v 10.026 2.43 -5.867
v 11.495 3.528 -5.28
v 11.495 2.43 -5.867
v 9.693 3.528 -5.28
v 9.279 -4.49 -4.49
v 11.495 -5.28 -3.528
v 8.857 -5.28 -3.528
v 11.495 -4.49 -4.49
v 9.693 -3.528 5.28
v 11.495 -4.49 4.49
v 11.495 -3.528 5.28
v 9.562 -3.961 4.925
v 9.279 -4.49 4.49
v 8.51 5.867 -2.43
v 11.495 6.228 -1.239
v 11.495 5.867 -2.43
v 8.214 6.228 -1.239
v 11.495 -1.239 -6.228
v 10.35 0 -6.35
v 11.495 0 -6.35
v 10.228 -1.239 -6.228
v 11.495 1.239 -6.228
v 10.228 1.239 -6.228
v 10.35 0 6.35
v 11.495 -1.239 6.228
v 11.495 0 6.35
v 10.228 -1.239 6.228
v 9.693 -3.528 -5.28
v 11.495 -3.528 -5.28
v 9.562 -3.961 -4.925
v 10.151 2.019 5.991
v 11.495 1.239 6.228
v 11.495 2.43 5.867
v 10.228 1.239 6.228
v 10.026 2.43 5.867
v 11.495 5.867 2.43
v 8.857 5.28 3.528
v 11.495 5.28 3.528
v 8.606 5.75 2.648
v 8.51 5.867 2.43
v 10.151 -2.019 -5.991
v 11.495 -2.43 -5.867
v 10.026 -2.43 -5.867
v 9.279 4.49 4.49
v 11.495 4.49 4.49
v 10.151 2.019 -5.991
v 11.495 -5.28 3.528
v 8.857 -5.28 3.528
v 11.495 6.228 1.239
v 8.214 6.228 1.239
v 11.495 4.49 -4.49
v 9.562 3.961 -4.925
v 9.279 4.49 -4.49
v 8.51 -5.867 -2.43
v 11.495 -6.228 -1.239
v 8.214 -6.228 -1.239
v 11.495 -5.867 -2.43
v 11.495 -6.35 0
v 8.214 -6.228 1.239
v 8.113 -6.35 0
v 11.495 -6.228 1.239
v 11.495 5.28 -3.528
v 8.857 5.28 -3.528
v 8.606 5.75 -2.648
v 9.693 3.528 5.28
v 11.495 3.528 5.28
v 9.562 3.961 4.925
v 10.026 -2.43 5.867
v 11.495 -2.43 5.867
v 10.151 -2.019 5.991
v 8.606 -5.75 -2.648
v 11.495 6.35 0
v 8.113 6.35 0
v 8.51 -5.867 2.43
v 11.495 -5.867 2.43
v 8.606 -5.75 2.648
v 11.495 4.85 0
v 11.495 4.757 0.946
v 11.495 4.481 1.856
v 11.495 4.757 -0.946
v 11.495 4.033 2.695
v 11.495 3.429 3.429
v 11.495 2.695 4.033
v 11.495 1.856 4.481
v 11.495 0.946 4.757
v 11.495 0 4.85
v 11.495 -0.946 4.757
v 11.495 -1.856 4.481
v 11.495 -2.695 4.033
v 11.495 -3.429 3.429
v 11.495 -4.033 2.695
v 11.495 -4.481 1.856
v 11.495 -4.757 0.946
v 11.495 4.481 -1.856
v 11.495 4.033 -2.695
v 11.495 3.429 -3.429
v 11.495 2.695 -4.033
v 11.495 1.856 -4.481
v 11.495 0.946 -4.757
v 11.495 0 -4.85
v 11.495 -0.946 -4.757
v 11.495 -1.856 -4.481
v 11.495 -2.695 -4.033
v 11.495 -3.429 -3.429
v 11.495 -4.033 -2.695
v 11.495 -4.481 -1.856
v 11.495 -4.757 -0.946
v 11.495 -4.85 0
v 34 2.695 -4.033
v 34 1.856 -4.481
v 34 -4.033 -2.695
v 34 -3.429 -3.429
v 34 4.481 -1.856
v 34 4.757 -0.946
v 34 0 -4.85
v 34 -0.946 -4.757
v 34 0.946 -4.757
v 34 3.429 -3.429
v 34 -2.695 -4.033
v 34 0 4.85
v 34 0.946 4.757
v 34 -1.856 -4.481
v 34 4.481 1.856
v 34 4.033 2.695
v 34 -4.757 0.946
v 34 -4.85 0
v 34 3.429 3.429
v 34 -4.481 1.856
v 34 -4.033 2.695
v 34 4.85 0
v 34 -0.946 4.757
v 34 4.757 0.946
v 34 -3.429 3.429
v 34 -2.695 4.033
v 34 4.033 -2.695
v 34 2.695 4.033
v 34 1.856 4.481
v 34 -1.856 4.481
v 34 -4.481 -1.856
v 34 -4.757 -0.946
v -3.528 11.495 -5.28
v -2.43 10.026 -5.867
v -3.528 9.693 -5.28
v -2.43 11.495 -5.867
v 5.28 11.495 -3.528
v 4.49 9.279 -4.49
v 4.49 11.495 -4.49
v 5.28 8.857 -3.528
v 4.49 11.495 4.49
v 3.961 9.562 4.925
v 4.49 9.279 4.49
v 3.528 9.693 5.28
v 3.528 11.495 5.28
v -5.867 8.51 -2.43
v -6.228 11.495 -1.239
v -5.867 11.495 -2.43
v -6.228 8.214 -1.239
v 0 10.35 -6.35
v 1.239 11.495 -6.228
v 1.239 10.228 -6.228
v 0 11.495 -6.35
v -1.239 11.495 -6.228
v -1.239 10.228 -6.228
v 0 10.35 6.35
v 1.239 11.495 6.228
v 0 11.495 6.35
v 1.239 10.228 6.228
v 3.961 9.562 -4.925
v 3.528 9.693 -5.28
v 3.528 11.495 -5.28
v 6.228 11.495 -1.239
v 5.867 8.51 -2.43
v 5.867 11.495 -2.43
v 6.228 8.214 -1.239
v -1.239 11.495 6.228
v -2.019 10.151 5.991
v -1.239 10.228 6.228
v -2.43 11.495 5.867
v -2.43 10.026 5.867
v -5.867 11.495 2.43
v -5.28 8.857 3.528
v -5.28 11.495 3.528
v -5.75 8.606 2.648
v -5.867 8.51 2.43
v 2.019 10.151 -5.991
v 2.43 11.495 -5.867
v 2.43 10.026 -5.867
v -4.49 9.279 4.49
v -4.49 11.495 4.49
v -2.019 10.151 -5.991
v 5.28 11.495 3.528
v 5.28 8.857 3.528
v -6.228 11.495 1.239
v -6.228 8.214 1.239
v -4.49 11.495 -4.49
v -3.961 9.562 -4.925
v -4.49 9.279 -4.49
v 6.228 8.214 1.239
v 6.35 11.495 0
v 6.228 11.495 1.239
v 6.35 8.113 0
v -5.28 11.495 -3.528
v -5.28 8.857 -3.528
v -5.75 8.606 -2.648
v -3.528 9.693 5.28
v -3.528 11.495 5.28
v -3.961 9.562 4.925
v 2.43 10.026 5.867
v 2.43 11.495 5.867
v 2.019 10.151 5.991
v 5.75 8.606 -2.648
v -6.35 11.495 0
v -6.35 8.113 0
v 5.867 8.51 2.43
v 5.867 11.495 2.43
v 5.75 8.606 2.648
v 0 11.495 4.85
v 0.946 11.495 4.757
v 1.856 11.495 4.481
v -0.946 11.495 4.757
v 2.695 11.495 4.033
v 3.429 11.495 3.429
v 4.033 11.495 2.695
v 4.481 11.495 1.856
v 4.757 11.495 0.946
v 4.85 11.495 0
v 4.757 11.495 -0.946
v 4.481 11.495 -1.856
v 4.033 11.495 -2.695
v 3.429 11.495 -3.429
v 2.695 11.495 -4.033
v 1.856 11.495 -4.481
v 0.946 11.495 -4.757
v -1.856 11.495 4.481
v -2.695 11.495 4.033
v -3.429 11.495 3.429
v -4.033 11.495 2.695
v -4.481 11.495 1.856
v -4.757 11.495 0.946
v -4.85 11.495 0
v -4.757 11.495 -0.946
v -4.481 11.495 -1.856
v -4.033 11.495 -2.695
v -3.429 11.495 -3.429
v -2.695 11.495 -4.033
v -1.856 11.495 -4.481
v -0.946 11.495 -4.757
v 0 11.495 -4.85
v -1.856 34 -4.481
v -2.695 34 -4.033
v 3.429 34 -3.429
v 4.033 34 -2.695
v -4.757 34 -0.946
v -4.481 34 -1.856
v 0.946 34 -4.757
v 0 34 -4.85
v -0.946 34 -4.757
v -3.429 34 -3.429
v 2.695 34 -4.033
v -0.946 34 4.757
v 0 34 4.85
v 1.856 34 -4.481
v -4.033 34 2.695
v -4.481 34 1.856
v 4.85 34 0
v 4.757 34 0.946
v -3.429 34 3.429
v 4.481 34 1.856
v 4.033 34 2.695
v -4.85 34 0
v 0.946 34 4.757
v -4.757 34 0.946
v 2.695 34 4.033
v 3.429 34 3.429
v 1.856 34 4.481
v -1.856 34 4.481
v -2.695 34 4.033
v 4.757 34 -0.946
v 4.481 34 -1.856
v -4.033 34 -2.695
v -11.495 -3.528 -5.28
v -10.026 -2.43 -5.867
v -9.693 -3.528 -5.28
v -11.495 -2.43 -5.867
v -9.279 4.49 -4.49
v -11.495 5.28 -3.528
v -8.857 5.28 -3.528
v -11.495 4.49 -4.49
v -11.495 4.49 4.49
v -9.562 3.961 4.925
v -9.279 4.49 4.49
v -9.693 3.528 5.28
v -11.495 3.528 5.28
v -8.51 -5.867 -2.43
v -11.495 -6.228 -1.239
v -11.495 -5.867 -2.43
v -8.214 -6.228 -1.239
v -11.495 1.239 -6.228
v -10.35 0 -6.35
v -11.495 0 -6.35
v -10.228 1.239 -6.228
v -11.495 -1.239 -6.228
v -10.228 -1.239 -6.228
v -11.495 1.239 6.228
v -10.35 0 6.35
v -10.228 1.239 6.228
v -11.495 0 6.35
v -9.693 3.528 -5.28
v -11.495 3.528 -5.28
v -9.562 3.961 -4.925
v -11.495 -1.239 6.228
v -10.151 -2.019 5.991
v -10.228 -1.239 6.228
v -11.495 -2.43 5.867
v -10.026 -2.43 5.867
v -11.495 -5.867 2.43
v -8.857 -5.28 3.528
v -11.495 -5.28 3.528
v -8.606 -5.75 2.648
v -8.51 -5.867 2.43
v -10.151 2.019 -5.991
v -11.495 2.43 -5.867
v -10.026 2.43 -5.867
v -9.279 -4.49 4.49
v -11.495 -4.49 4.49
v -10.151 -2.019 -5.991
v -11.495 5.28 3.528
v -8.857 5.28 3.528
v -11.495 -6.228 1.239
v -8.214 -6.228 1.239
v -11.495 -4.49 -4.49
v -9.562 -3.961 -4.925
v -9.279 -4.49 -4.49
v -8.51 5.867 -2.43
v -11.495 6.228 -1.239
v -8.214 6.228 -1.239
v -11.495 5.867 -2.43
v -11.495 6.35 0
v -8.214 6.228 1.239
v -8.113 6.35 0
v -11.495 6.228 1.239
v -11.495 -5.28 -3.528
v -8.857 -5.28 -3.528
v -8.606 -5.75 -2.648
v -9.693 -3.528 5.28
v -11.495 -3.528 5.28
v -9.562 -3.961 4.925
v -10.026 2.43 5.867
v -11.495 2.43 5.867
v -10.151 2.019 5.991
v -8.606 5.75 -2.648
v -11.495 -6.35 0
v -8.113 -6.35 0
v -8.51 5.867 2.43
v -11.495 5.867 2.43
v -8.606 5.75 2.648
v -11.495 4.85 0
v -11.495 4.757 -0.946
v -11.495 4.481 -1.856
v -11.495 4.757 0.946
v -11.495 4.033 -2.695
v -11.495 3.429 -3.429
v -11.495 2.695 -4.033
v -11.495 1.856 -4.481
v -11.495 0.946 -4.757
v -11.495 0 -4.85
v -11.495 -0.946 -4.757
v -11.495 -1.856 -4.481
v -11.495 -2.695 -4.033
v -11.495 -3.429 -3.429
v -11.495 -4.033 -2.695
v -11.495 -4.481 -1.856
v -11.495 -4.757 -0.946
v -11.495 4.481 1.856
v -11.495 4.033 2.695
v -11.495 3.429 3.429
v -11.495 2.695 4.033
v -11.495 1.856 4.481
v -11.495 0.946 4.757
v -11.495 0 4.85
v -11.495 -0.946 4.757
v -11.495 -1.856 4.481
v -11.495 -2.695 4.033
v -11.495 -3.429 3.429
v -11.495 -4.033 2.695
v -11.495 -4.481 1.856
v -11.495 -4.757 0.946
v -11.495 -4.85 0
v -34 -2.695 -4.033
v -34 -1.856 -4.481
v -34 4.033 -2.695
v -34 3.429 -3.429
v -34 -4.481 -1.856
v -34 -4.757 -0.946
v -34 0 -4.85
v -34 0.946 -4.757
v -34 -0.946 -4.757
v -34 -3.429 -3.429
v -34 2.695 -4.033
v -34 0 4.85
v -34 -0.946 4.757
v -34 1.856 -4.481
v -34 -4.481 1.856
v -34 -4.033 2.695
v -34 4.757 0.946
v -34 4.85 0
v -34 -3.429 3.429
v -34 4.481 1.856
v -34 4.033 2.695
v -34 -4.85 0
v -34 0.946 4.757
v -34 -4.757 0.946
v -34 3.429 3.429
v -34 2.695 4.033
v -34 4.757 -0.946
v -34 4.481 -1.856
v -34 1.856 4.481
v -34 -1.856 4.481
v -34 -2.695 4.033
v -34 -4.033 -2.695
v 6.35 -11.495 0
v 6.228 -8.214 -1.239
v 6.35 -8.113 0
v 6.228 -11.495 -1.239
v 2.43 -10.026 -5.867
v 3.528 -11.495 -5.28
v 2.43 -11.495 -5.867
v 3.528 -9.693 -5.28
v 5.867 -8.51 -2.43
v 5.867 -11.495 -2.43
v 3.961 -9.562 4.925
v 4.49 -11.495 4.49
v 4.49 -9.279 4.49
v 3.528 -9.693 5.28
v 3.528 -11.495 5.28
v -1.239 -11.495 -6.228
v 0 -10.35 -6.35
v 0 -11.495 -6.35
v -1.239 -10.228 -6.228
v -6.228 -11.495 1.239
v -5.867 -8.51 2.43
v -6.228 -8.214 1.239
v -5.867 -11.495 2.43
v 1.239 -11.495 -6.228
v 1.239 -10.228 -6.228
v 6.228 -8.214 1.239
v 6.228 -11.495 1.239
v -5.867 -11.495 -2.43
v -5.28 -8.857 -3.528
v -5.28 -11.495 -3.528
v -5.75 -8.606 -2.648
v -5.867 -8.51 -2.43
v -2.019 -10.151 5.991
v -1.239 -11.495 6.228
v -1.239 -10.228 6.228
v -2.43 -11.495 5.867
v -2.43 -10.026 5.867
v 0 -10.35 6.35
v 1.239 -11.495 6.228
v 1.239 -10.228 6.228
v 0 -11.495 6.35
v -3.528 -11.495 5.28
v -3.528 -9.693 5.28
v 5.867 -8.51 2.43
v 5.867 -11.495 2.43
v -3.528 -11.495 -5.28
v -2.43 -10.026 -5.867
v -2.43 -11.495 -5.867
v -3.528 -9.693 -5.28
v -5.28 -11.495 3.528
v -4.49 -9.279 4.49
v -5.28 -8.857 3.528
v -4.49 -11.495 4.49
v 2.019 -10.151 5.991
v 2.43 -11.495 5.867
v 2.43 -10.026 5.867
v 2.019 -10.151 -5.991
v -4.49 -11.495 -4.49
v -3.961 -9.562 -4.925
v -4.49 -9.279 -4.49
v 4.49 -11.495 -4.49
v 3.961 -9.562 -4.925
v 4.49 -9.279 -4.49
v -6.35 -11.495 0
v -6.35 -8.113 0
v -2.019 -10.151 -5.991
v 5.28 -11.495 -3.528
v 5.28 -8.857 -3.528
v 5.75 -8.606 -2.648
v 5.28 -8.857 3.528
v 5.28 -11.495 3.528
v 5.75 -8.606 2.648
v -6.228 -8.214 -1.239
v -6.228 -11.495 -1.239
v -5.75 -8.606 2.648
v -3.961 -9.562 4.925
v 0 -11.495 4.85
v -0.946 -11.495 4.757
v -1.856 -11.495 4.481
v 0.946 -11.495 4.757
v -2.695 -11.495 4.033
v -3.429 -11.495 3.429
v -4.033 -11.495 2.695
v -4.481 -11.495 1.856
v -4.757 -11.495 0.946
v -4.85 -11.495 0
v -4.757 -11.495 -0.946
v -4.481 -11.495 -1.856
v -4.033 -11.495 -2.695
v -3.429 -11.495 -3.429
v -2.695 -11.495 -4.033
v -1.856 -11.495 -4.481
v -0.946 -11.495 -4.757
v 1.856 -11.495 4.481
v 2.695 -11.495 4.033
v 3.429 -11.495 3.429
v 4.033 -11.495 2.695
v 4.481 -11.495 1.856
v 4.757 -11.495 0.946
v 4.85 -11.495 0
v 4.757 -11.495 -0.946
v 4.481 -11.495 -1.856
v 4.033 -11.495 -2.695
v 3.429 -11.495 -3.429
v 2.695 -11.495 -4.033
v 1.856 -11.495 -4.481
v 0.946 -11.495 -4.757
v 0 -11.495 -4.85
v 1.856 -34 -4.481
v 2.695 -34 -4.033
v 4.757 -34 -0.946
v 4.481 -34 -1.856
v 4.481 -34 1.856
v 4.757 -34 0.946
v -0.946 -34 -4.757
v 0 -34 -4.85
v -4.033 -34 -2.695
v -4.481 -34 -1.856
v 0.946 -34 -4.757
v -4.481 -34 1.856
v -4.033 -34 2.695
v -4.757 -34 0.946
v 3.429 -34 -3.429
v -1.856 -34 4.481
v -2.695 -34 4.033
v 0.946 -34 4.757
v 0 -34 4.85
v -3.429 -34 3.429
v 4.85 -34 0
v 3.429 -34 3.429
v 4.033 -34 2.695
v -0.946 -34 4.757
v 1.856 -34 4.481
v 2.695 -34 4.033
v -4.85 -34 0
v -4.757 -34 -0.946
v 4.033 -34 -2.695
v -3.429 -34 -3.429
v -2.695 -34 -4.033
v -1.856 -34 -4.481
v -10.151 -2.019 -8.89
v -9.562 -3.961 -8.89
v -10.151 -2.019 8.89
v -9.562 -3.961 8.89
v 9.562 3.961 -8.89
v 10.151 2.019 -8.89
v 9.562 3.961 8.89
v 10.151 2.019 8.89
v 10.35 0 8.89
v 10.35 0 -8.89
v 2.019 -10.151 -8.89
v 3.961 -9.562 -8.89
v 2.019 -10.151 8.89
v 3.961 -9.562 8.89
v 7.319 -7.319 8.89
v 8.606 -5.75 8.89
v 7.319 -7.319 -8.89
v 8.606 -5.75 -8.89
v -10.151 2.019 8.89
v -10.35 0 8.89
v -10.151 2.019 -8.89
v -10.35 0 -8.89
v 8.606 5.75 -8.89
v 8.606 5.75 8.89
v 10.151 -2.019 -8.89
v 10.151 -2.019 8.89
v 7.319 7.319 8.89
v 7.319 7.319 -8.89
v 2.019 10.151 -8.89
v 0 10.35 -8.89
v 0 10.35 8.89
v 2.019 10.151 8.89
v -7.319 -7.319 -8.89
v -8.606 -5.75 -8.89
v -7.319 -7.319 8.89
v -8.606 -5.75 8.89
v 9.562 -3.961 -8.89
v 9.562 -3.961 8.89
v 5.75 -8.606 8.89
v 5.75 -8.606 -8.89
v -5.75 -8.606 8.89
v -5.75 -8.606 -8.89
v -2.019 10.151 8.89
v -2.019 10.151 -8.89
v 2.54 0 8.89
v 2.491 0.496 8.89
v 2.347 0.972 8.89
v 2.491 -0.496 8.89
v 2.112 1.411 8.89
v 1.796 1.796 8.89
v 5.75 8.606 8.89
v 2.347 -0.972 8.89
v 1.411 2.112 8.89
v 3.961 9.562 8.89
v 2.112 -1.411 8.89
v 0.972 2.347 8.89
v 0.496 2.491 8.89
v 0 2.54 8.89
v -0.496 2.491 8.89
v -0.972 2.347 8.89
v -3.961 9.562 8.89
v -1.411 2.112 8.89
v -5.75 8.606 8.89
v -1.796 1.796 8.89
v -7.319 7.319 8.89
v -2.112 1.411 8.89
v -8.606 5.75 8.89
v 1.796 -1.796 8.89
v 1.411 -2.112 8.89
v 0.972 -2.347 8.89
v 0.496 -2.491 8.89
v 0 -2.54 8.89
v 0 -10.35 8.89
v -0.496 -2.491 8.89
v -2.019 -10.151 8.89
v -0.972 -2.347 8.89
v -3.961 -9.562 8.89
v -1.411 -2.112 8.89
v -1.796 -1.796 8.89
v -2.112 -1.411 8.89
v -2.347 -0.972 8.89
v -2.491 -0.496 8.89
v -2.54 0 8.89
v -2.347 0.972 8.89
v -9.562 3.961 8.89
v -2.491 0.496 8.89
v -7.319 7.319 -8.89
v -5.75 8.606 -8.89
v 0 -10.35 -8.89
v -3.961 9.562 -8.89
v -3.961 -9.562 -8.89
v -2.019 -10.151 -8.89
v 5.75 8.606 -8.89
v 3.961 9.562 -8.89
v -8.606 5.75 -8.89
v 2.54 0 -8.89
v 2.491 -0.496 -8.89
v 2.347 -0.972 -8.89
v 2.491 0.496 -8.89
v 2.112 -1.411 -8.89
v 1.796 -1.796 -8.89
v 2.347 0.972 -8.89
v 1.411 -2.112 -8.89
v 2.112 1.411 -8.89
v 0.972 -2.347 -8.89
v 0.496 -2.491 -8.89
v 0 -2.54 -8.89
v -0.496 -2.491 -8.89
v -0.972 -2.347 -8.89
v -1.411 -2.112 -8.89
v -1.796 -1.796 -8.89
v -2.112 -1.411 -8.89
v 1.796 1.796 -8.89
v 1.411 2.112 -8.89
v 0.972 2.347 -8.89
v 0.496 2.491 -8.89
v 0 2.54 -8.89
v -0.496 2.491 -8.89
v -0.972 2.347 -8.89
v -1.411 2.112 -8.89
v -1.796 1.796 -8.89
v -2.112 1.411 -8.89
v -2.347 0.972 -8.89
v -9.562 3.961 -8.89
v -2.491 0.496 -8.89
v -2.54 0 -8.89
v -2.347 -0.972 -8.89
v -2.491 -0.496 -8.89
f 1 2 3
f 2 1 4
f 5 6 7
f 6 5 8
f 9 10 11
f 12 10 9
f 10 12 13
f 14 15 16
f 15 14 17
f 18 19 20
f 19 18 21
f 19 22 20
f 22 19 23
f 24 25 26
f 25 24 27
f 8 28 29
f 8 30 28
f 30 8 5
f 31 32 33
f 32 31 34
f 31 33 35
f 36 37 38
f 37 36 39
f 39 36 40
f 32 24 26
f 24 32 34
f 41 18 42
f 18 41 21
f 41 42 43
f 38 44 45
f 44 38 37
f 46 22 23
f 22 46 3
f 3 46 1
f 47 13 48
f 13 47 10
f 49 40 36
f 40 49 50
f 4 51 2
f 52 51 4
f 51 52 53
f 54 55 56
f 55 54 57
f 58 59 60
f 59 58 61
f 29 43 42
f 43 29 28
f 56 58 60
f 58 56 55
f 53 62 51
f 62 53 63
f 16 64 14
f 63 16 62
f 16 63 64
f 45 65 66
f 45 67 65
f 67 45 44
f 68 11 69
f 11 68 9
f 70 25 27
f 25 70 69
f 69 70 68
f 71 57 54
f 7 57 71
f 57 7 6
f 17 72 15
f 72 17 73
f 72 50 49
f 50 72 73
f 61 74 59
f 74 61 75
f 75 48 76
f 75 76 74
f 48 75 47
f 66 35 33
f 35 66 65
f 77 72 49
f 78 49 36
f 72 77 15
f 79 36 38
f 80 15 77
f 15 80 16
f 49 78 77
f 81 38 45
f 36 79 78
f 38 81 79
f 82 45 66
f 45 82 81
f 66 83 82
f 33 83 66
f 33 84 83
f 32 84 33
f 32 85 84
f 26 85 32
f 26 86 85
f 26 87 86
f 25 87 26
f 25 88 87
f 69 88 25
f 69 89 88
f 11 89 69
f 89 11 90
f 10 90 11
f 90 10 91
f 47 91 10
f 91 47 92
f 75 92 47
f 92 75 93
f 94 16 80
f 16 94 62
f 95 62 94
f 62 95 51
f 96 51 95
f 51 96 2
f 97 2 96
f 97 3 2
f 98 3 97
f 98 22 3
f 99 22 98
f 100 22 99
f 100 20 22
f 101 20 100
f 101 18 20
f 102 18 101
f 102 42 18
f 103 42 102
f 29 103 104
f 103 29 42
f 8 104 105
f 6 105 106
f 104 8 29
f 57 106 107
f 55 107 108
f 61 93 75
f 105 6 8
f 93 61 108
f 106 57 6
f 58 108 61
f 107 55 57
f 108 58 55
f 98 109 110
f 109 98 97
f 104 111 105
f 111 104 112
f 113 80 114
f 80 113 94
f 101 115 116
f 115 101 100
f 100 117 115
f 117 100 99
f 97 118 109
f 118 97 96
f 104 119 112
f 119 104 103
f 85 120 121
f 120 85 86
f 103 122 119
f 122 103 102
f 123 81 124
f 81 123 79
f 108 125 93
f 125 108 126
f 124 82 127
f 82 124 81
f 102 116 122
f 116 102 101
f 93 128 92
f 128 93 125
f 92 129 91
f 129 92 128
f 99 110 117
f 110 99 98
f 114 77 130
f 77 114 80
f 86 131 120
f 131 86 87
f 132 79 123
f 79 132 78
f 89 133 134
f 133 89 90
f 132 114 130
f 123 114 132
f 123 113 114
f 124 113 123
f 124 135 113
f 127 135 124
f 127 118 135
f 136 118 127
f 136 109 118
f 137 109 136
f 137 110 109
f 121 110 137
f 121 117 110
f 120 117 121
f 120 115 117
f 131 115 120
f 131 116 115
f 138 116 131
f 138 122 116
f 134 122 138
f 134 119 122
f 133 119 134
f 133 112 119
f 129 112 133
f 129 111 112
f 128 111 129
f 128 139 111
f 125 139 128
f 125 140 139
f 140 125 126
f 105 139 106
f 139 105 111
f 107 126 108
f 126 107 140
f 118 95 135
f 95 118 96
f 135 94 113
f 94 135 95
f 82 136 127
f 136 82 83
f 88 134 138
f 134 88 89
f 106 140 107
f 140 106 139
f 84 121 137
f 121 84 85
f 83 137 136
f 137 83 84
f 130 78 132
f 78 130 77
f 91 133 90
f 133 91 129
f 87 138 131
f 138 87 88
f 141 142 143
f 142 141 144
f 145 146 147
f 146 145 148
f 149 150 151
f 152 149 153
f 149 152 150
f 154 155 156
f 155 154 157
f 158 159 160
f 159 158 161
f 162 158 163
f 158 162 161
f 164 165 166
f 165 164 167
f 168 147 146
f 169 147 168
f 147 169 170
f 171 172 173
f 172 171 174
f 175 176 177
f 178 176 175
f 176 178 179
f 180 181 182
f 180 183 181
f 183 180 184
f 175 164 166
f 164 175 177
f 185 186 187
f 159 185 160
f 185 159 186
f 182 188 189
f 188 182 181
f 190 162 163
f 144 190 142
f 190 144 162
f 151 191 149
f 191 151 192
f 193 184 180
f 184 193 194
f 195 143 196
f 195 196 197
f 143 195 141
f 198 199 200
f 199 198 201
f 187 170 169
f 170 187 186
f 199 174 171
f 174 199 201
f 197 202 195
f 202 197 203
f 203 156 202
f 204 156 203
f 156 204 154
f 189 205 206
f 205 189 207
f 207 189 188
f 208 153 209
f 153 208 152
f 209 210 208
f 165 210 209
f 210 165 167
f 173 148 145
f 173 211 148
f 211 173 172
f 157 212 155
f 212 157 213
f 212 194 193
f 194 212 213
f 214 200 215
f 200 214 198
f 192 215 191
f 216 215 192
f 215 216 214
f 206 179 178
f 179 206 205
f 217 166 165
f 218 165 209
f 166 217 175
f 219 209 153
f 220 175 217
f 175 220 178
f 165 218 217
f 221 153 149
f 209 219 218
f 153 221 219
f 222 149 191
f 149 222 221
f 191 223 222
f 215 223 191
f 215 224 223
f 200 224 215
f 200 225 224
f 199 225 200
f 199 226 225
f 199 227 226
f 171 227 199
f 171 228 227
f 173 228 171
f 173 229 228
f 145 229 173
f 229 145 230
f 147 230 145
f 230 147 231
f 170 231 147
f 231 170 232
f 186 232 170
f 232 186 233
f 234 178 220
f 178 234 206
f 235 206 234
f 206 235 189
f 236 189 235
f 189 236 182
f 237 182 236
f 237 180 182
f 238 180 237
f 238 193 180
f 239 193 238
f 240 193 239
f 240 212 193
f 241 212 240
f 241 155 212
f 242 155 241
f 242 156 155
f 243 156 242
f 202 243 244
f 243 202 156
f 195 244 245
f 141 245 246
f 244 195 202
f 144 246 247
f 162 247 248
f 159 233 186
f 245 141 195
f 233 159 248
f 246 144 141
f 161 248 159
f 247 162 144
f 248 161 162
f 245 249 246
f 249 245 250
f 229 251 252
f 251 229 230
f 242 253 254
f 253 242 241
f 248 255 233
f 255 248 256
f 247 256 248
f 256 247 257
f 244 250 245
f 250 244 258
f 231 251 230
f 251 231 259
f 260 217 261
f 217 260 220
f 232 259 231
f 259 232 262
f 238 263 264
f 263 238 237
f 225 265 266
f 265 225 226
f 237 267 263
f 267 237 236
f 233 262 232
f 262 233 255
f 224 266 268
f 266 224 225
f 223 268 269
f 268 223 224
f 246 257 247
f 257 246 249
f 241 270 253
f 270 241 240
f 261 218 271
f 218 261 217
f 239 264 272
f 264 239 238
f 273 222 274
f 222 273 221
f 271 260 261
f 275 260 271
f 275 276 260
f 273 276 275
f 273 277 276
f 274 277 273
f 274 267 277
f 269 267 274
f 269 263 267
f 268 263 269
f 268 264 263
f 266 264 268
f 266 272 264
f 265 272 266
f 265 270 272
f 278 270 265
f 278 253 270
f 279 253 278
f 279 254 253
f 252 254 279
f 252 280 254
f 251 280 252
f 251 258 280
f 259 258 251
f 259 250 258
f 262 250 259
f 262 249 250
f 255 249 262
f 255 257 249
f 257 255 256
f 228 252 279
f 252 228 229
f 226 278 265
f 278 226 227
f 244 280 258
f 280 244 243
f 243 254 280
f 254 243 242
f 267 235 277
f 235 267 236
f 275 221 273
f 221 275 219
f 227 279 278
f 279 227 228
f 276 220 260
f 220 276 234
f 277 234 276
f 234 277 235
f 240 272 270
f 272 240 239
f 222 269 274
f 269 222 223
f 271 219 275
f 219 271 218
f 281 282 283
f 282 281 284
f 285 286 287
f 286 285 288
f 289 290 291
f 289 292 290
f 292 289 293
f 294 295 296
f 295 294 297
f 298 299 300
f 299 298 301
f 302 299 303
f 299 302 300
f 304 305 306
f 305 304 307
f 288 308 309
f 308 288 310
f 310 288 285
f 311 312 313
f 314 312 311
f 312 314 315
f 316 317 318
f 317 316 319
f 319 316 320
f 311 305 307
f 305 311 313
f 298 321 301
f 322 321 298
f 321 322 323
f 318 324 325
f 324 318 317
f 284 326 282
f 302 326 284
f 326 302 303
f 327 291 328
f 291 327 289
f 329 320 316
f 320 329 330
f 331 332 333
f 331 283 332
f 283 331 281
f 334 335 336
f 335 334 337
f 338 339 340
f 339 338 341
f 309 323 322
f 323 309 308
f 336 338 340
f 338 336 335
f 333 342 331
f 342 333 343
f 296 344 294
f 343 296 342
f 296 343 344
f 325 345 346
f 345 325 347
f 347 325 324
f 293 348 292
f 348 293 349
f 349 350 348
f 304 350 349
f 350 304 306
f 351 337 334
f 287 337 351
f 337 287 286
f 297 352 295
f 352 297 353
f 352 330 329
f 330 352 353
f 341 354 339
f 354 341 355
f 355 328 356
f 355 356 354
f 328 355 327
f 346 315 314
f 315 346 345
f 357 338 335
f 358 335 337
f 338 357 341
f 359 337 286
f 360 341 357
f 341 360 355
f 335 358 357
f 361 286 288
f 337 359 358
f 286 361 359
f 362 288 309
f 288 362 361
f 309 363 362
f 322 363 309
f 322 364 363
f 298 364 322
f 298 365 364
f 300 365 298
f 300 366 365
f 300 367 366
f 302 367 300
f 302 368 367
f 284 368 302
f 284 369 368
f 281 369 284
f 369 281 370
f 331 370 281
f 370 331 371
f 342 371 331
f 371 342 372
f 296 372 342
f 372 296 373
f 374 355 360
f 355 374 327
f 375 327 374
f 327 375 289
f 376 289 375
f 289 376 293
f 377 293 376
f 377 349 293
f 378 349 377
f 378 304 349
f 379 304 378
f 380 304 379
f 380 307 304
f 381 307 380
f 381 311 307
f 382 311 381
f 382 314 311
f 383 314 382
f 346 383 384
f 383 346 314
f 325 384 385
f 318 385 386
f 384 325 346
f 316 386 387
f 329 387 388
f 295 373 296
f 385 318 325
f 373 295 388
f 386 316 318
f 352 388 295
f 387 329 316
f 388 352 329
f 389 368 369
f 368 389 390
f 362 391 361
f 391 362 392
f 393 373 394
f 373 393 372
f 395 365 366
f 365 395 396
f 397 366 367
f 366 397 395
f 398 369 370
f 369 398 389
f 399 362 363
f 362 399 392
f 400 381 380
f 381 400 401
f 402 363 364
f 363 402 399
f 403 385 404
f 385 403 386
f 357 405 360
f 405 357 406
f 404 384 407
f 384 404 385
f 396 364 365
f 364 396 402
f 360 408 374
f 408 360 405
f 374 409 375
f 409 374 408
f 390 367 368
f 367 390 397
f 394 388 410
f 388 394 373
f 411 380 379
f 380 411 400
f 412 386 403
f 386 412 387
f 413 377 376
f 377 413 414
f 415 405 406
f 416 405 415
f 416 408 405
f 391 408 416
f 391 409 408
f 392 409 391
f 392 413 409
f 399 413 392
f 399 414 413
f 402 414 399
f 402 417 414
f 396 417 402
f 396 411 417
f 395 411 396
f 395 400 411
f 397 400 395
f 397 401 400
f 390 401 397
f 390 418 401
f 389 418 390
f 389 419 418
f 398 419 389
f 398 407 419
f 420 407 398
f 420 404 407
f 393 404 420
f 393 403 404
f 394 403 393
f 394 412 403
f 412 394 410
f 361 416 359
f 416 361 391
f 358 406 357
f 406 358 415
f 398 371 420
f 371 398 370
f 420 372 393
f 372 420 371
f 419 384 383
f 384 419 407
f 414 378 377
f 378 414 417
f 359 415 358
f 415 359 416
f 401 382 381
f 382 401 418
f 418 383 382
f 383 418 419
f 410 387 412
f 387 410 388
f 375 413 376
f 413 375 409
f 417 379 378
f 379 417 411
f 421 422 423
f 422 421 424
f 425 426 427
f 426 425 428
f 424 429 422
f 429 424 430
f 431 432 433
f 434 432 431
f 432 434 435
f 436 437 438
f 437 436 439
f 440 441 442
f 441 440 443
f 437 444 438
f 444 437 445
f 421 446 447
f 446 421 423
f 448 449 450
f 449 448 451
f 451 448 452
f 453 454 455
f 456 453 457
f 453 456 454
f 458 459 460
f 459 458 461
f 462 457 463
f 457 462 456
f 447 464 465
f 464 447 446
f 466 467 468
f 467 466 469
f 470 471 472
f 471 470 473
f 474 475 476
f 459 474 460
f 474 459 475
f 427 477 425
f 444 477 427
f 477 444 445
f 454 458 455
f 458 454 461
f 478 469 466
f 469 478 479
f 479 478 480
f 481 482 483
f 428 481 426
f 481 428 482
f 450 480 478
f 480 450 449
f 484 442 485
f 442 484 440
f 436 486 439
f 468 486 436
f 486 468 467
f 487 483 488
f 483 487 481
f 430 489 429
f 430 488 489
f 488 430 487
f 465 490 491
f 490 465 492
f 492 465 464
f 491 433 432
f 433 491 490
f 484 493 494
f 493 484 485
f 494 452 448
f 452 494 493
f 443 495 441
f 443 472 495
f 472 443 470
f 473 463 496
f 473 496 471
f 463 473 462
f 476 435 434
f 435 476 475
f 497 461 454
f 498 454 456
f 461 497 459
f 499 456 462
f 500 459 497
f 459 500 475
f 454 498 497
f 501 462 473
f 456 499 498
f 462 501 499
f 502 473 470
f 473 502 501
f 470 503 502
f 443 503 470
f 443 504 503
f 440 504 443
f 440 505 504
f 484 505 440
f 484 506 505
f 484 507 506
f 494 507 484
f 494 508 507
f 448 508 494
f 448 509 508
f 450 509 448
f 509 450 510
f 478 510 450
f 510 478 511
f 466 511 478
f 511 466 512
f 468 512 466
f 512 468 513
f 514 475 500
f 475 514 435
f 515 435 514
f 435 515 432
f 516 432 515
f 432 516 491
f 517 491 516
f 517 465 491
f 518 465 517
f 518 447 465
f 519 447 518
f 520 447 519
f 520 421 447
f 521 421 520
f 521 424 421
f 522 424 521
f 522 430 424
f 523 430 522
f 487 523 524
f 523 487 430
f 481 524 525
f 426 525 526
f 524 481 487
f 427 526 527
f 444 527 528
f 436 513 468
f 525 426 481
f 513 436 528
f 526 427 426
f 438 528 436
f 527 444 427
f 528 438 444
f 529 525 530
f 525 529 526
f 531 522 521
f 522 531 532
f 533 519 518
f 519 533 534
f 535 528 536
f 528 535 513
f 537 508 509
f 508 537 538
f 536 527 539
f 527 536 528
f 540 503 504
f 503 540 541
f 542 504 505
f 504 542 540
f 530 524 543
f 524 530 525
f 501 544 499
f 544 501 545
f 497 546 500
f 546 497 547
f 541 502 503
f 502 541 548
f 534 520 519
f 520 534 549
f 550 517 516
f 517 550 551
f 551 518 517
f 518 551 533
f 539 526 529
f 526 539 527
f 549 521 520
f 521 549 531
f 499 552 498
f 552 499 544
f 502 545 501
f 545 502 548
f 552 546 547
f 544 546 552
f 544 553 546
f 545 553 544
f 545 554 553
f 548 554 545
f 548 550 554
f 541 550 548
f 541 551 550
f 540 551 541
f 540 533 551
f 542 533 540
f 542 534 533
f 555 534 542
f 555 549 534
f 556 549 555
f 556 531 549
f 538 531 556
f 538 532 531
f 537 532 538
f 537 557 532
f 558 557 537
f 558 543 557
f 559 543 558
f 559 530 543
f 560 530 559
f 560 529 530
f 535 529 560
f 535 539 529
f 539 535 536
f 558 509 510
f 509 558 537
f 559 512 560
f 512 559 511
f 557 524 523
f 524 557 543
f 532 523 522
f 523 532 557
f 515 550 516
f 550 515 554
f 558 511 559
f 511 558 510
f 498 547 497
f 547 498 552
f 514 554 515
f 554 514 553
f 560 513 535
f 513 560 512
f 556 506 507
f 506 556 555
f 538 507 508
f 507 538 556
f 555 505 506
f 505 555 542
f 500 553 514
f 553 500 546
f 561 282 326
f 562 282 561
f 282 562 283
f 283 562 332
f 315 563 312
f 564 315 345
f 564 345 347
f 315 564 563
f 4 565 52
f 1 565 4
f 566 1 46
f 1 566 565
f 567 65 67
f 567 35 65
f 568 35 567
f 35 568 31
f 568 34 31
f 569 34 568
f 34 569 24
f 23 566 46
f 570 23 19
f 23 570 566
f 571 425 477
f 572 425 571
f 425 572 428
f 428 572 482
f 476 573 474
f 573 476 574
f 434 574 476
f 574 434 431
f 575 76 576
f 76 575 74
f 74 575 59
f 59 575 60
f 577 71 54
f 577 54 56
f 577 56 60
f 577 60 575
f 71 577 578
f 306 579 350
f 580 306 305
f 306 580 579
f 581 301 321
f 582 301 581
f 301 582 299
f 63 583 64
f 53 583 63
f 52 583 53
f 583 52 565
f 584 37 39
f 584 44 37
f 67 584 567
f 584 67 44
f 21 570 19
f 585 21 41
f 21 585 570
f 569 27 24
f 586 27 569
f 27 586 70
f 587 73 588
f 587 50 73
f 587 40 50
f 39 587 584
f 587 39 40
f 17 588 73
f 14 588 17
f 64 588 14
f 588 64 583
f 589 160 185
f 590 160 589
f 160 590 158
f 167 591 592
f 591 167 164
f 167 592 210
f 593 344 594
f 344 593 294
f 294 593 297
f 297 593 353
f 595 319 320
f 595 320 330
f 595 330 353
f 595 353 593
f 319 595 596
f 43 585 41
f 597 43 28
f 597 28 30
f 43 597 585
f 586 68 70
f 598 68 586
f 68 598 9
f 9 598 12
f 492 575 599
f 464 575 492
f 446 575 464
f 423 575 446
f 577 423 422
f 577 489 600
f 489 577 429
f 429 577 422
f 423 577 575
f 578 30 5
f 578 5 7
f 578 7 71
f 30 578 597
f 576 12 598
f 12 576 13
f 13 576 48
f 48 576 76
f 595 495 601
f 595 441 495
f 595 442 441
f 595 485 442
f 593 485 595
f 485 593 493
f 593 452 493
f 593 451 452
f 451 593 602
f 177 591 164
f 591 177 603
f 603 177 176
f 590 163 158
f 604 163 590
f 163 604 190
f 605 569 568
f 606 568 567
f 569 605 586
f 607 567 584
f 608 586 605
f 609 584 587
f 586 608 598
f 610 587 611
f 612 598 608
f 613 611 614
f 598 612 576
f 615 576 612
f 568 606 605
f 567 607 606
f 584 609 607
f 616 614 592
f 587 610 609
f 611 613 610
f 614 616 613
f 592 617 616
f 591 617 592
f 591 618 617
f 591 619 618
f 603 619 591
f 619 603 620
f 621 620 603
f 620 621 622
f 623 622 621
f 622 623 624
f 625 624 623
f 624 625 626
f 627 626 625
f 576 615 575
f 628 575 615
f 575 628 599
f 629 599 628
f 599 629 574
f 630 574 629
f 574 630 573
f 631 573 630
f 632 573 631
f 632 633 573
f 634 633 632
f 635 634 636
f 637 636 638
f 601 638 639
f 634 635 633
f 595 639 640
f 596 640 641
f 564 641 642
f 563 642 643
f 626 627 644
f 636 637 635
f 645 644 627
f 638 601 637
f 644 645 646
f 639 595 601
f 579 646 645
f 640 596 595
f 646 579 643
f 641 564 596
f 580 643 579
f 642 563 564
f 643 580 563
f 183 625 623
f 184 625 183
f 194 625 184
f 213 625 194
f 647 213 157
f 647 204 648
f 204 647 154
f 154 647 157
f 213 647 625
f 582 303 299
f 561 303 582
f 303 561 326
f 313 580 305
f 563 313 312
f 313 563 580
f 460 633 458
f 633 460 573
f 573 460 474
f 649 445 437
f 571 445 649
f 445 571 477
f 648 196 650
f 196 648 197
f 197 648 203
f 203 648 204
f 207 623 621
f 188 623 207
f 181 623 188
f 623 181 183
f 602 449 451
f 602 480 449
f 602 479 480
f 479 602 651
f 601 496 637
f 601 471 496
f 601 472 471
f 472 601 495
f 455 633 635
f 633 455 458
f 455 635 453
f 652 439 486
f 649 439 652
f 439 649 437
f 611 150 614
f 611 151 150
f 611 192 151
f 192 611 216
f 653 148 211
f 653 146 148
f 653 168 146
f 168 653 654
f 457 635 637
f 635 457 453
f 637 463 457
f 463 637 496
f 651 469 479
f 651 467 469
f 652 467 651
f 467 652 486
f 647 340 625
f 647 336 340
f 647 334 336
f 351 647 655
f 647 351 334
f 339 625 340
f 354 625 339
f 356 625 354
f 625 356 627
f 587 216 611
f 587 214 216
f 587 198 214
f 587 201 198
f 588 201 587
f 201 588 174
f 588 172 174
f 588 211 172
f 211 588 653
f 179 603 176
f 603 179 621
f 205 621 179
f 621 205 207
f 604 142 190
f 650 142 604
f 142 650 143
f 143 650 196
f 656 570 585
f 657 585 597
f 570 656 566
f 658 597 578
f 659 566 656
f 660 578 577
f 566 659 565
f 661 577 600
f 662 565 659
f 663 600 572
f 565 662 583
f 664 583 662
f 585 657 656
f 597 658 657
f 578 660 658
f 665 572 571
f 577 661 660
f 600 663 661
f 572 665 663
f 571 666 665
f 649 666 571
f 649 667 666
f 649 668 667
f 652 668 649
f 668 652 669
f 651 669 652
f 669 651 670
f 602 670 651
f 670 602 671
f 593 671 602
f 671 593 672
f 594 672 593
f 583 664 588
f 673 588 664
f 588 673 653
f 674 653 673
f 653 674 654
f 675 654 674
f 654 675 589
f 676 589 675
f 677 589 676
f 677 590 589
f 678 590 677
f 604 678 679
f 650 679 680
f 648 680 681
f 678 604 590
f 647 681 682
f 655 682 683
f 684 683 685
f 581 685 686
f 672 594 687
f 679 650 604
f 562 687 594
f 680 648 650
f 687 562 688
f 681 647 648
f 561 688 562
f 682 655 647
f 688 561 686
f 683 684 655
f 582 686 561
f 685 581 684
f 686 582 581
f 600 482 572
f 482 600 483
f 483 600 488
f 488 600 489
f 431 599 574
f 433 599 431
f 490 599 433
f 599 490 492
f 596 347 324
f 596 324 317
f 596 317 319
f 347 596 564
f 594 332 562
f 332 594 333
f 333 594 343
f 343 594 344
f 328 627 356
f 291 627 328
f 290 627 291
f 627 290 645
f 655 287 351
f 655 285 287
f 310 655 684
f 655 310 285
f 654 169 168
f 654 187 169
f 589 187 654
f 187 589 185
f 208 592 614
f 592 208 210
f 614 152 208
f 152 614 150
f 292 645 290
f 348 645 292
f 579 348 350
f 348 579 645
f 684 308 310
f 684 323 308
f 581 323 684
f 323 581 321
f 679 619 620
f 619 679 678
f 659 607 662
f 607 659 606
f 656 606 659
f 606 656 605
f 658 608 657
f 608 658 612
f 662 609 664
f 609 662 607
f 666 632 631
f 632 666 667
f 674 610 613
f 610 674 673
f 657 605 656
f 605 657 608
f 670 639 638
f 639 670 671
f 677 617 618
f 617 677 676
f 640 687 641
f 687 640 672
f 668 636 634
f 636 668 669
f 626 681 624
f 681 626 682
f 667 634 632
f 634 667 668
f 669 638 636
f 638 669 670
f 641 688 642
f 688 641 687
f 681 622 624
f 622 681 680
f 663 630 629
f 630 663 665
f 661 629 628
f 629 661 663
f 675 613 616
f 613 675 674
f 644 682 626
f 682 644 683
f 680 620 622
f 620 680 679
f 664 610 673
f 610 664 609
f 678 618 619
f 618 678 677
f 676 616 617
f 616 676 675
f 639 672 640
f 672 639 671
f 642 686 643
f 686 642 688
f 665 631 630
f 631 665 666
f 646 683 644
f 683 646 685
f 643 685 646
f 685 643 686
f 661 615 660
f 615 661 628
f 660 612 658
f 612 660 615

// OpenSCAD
$fn = 32;

// ----------------------------------------------------------------------
// Cardan cross: 68 mm span, 12.7 mm trunnions
// ----------------------------------------------------------------------

// --- parameters (mm) ---
journal_d = 12.7;         // trunnion diameter
arm_len = 34;             // trunnion length from the centre
step_r = 4.32;            // step position from the centre
step_d = 9.7;             // journal diameter after the step
hub_d = 20.7;             // hub diameter
hub_h = 17.78;            // hub height
bore_d = 5.08;            // hub bore

difference() {
  union() {
    /* hub along the joint axis */
    cylinder(h = hub_h, d = hub_d, center = true);
    for (a = [0 : 90 : 270]) rotate([0, 0, a]) {
      /* trunnion, sunk into the hub */
      translate([hub_d / 4, 0, 0]) rotate([0, 90, 0]) cylinder(h = step_r + 2, d = journal_d);
      /* stepped journal out to the tip */
      translate([step_r - 0.5, 0, 0]) rotate([0, 90, 0]) cylinder(h = arm_len + 0.5 - step_r, d = step_d);
    }
  }
  /* lubrication bore through the hub, 2.5 mm clear on both sides */
  translate([0, 0, -hub_h / 2 - 2.5]) cylinder(h = hub_h + 5, d = bore_d);
}
